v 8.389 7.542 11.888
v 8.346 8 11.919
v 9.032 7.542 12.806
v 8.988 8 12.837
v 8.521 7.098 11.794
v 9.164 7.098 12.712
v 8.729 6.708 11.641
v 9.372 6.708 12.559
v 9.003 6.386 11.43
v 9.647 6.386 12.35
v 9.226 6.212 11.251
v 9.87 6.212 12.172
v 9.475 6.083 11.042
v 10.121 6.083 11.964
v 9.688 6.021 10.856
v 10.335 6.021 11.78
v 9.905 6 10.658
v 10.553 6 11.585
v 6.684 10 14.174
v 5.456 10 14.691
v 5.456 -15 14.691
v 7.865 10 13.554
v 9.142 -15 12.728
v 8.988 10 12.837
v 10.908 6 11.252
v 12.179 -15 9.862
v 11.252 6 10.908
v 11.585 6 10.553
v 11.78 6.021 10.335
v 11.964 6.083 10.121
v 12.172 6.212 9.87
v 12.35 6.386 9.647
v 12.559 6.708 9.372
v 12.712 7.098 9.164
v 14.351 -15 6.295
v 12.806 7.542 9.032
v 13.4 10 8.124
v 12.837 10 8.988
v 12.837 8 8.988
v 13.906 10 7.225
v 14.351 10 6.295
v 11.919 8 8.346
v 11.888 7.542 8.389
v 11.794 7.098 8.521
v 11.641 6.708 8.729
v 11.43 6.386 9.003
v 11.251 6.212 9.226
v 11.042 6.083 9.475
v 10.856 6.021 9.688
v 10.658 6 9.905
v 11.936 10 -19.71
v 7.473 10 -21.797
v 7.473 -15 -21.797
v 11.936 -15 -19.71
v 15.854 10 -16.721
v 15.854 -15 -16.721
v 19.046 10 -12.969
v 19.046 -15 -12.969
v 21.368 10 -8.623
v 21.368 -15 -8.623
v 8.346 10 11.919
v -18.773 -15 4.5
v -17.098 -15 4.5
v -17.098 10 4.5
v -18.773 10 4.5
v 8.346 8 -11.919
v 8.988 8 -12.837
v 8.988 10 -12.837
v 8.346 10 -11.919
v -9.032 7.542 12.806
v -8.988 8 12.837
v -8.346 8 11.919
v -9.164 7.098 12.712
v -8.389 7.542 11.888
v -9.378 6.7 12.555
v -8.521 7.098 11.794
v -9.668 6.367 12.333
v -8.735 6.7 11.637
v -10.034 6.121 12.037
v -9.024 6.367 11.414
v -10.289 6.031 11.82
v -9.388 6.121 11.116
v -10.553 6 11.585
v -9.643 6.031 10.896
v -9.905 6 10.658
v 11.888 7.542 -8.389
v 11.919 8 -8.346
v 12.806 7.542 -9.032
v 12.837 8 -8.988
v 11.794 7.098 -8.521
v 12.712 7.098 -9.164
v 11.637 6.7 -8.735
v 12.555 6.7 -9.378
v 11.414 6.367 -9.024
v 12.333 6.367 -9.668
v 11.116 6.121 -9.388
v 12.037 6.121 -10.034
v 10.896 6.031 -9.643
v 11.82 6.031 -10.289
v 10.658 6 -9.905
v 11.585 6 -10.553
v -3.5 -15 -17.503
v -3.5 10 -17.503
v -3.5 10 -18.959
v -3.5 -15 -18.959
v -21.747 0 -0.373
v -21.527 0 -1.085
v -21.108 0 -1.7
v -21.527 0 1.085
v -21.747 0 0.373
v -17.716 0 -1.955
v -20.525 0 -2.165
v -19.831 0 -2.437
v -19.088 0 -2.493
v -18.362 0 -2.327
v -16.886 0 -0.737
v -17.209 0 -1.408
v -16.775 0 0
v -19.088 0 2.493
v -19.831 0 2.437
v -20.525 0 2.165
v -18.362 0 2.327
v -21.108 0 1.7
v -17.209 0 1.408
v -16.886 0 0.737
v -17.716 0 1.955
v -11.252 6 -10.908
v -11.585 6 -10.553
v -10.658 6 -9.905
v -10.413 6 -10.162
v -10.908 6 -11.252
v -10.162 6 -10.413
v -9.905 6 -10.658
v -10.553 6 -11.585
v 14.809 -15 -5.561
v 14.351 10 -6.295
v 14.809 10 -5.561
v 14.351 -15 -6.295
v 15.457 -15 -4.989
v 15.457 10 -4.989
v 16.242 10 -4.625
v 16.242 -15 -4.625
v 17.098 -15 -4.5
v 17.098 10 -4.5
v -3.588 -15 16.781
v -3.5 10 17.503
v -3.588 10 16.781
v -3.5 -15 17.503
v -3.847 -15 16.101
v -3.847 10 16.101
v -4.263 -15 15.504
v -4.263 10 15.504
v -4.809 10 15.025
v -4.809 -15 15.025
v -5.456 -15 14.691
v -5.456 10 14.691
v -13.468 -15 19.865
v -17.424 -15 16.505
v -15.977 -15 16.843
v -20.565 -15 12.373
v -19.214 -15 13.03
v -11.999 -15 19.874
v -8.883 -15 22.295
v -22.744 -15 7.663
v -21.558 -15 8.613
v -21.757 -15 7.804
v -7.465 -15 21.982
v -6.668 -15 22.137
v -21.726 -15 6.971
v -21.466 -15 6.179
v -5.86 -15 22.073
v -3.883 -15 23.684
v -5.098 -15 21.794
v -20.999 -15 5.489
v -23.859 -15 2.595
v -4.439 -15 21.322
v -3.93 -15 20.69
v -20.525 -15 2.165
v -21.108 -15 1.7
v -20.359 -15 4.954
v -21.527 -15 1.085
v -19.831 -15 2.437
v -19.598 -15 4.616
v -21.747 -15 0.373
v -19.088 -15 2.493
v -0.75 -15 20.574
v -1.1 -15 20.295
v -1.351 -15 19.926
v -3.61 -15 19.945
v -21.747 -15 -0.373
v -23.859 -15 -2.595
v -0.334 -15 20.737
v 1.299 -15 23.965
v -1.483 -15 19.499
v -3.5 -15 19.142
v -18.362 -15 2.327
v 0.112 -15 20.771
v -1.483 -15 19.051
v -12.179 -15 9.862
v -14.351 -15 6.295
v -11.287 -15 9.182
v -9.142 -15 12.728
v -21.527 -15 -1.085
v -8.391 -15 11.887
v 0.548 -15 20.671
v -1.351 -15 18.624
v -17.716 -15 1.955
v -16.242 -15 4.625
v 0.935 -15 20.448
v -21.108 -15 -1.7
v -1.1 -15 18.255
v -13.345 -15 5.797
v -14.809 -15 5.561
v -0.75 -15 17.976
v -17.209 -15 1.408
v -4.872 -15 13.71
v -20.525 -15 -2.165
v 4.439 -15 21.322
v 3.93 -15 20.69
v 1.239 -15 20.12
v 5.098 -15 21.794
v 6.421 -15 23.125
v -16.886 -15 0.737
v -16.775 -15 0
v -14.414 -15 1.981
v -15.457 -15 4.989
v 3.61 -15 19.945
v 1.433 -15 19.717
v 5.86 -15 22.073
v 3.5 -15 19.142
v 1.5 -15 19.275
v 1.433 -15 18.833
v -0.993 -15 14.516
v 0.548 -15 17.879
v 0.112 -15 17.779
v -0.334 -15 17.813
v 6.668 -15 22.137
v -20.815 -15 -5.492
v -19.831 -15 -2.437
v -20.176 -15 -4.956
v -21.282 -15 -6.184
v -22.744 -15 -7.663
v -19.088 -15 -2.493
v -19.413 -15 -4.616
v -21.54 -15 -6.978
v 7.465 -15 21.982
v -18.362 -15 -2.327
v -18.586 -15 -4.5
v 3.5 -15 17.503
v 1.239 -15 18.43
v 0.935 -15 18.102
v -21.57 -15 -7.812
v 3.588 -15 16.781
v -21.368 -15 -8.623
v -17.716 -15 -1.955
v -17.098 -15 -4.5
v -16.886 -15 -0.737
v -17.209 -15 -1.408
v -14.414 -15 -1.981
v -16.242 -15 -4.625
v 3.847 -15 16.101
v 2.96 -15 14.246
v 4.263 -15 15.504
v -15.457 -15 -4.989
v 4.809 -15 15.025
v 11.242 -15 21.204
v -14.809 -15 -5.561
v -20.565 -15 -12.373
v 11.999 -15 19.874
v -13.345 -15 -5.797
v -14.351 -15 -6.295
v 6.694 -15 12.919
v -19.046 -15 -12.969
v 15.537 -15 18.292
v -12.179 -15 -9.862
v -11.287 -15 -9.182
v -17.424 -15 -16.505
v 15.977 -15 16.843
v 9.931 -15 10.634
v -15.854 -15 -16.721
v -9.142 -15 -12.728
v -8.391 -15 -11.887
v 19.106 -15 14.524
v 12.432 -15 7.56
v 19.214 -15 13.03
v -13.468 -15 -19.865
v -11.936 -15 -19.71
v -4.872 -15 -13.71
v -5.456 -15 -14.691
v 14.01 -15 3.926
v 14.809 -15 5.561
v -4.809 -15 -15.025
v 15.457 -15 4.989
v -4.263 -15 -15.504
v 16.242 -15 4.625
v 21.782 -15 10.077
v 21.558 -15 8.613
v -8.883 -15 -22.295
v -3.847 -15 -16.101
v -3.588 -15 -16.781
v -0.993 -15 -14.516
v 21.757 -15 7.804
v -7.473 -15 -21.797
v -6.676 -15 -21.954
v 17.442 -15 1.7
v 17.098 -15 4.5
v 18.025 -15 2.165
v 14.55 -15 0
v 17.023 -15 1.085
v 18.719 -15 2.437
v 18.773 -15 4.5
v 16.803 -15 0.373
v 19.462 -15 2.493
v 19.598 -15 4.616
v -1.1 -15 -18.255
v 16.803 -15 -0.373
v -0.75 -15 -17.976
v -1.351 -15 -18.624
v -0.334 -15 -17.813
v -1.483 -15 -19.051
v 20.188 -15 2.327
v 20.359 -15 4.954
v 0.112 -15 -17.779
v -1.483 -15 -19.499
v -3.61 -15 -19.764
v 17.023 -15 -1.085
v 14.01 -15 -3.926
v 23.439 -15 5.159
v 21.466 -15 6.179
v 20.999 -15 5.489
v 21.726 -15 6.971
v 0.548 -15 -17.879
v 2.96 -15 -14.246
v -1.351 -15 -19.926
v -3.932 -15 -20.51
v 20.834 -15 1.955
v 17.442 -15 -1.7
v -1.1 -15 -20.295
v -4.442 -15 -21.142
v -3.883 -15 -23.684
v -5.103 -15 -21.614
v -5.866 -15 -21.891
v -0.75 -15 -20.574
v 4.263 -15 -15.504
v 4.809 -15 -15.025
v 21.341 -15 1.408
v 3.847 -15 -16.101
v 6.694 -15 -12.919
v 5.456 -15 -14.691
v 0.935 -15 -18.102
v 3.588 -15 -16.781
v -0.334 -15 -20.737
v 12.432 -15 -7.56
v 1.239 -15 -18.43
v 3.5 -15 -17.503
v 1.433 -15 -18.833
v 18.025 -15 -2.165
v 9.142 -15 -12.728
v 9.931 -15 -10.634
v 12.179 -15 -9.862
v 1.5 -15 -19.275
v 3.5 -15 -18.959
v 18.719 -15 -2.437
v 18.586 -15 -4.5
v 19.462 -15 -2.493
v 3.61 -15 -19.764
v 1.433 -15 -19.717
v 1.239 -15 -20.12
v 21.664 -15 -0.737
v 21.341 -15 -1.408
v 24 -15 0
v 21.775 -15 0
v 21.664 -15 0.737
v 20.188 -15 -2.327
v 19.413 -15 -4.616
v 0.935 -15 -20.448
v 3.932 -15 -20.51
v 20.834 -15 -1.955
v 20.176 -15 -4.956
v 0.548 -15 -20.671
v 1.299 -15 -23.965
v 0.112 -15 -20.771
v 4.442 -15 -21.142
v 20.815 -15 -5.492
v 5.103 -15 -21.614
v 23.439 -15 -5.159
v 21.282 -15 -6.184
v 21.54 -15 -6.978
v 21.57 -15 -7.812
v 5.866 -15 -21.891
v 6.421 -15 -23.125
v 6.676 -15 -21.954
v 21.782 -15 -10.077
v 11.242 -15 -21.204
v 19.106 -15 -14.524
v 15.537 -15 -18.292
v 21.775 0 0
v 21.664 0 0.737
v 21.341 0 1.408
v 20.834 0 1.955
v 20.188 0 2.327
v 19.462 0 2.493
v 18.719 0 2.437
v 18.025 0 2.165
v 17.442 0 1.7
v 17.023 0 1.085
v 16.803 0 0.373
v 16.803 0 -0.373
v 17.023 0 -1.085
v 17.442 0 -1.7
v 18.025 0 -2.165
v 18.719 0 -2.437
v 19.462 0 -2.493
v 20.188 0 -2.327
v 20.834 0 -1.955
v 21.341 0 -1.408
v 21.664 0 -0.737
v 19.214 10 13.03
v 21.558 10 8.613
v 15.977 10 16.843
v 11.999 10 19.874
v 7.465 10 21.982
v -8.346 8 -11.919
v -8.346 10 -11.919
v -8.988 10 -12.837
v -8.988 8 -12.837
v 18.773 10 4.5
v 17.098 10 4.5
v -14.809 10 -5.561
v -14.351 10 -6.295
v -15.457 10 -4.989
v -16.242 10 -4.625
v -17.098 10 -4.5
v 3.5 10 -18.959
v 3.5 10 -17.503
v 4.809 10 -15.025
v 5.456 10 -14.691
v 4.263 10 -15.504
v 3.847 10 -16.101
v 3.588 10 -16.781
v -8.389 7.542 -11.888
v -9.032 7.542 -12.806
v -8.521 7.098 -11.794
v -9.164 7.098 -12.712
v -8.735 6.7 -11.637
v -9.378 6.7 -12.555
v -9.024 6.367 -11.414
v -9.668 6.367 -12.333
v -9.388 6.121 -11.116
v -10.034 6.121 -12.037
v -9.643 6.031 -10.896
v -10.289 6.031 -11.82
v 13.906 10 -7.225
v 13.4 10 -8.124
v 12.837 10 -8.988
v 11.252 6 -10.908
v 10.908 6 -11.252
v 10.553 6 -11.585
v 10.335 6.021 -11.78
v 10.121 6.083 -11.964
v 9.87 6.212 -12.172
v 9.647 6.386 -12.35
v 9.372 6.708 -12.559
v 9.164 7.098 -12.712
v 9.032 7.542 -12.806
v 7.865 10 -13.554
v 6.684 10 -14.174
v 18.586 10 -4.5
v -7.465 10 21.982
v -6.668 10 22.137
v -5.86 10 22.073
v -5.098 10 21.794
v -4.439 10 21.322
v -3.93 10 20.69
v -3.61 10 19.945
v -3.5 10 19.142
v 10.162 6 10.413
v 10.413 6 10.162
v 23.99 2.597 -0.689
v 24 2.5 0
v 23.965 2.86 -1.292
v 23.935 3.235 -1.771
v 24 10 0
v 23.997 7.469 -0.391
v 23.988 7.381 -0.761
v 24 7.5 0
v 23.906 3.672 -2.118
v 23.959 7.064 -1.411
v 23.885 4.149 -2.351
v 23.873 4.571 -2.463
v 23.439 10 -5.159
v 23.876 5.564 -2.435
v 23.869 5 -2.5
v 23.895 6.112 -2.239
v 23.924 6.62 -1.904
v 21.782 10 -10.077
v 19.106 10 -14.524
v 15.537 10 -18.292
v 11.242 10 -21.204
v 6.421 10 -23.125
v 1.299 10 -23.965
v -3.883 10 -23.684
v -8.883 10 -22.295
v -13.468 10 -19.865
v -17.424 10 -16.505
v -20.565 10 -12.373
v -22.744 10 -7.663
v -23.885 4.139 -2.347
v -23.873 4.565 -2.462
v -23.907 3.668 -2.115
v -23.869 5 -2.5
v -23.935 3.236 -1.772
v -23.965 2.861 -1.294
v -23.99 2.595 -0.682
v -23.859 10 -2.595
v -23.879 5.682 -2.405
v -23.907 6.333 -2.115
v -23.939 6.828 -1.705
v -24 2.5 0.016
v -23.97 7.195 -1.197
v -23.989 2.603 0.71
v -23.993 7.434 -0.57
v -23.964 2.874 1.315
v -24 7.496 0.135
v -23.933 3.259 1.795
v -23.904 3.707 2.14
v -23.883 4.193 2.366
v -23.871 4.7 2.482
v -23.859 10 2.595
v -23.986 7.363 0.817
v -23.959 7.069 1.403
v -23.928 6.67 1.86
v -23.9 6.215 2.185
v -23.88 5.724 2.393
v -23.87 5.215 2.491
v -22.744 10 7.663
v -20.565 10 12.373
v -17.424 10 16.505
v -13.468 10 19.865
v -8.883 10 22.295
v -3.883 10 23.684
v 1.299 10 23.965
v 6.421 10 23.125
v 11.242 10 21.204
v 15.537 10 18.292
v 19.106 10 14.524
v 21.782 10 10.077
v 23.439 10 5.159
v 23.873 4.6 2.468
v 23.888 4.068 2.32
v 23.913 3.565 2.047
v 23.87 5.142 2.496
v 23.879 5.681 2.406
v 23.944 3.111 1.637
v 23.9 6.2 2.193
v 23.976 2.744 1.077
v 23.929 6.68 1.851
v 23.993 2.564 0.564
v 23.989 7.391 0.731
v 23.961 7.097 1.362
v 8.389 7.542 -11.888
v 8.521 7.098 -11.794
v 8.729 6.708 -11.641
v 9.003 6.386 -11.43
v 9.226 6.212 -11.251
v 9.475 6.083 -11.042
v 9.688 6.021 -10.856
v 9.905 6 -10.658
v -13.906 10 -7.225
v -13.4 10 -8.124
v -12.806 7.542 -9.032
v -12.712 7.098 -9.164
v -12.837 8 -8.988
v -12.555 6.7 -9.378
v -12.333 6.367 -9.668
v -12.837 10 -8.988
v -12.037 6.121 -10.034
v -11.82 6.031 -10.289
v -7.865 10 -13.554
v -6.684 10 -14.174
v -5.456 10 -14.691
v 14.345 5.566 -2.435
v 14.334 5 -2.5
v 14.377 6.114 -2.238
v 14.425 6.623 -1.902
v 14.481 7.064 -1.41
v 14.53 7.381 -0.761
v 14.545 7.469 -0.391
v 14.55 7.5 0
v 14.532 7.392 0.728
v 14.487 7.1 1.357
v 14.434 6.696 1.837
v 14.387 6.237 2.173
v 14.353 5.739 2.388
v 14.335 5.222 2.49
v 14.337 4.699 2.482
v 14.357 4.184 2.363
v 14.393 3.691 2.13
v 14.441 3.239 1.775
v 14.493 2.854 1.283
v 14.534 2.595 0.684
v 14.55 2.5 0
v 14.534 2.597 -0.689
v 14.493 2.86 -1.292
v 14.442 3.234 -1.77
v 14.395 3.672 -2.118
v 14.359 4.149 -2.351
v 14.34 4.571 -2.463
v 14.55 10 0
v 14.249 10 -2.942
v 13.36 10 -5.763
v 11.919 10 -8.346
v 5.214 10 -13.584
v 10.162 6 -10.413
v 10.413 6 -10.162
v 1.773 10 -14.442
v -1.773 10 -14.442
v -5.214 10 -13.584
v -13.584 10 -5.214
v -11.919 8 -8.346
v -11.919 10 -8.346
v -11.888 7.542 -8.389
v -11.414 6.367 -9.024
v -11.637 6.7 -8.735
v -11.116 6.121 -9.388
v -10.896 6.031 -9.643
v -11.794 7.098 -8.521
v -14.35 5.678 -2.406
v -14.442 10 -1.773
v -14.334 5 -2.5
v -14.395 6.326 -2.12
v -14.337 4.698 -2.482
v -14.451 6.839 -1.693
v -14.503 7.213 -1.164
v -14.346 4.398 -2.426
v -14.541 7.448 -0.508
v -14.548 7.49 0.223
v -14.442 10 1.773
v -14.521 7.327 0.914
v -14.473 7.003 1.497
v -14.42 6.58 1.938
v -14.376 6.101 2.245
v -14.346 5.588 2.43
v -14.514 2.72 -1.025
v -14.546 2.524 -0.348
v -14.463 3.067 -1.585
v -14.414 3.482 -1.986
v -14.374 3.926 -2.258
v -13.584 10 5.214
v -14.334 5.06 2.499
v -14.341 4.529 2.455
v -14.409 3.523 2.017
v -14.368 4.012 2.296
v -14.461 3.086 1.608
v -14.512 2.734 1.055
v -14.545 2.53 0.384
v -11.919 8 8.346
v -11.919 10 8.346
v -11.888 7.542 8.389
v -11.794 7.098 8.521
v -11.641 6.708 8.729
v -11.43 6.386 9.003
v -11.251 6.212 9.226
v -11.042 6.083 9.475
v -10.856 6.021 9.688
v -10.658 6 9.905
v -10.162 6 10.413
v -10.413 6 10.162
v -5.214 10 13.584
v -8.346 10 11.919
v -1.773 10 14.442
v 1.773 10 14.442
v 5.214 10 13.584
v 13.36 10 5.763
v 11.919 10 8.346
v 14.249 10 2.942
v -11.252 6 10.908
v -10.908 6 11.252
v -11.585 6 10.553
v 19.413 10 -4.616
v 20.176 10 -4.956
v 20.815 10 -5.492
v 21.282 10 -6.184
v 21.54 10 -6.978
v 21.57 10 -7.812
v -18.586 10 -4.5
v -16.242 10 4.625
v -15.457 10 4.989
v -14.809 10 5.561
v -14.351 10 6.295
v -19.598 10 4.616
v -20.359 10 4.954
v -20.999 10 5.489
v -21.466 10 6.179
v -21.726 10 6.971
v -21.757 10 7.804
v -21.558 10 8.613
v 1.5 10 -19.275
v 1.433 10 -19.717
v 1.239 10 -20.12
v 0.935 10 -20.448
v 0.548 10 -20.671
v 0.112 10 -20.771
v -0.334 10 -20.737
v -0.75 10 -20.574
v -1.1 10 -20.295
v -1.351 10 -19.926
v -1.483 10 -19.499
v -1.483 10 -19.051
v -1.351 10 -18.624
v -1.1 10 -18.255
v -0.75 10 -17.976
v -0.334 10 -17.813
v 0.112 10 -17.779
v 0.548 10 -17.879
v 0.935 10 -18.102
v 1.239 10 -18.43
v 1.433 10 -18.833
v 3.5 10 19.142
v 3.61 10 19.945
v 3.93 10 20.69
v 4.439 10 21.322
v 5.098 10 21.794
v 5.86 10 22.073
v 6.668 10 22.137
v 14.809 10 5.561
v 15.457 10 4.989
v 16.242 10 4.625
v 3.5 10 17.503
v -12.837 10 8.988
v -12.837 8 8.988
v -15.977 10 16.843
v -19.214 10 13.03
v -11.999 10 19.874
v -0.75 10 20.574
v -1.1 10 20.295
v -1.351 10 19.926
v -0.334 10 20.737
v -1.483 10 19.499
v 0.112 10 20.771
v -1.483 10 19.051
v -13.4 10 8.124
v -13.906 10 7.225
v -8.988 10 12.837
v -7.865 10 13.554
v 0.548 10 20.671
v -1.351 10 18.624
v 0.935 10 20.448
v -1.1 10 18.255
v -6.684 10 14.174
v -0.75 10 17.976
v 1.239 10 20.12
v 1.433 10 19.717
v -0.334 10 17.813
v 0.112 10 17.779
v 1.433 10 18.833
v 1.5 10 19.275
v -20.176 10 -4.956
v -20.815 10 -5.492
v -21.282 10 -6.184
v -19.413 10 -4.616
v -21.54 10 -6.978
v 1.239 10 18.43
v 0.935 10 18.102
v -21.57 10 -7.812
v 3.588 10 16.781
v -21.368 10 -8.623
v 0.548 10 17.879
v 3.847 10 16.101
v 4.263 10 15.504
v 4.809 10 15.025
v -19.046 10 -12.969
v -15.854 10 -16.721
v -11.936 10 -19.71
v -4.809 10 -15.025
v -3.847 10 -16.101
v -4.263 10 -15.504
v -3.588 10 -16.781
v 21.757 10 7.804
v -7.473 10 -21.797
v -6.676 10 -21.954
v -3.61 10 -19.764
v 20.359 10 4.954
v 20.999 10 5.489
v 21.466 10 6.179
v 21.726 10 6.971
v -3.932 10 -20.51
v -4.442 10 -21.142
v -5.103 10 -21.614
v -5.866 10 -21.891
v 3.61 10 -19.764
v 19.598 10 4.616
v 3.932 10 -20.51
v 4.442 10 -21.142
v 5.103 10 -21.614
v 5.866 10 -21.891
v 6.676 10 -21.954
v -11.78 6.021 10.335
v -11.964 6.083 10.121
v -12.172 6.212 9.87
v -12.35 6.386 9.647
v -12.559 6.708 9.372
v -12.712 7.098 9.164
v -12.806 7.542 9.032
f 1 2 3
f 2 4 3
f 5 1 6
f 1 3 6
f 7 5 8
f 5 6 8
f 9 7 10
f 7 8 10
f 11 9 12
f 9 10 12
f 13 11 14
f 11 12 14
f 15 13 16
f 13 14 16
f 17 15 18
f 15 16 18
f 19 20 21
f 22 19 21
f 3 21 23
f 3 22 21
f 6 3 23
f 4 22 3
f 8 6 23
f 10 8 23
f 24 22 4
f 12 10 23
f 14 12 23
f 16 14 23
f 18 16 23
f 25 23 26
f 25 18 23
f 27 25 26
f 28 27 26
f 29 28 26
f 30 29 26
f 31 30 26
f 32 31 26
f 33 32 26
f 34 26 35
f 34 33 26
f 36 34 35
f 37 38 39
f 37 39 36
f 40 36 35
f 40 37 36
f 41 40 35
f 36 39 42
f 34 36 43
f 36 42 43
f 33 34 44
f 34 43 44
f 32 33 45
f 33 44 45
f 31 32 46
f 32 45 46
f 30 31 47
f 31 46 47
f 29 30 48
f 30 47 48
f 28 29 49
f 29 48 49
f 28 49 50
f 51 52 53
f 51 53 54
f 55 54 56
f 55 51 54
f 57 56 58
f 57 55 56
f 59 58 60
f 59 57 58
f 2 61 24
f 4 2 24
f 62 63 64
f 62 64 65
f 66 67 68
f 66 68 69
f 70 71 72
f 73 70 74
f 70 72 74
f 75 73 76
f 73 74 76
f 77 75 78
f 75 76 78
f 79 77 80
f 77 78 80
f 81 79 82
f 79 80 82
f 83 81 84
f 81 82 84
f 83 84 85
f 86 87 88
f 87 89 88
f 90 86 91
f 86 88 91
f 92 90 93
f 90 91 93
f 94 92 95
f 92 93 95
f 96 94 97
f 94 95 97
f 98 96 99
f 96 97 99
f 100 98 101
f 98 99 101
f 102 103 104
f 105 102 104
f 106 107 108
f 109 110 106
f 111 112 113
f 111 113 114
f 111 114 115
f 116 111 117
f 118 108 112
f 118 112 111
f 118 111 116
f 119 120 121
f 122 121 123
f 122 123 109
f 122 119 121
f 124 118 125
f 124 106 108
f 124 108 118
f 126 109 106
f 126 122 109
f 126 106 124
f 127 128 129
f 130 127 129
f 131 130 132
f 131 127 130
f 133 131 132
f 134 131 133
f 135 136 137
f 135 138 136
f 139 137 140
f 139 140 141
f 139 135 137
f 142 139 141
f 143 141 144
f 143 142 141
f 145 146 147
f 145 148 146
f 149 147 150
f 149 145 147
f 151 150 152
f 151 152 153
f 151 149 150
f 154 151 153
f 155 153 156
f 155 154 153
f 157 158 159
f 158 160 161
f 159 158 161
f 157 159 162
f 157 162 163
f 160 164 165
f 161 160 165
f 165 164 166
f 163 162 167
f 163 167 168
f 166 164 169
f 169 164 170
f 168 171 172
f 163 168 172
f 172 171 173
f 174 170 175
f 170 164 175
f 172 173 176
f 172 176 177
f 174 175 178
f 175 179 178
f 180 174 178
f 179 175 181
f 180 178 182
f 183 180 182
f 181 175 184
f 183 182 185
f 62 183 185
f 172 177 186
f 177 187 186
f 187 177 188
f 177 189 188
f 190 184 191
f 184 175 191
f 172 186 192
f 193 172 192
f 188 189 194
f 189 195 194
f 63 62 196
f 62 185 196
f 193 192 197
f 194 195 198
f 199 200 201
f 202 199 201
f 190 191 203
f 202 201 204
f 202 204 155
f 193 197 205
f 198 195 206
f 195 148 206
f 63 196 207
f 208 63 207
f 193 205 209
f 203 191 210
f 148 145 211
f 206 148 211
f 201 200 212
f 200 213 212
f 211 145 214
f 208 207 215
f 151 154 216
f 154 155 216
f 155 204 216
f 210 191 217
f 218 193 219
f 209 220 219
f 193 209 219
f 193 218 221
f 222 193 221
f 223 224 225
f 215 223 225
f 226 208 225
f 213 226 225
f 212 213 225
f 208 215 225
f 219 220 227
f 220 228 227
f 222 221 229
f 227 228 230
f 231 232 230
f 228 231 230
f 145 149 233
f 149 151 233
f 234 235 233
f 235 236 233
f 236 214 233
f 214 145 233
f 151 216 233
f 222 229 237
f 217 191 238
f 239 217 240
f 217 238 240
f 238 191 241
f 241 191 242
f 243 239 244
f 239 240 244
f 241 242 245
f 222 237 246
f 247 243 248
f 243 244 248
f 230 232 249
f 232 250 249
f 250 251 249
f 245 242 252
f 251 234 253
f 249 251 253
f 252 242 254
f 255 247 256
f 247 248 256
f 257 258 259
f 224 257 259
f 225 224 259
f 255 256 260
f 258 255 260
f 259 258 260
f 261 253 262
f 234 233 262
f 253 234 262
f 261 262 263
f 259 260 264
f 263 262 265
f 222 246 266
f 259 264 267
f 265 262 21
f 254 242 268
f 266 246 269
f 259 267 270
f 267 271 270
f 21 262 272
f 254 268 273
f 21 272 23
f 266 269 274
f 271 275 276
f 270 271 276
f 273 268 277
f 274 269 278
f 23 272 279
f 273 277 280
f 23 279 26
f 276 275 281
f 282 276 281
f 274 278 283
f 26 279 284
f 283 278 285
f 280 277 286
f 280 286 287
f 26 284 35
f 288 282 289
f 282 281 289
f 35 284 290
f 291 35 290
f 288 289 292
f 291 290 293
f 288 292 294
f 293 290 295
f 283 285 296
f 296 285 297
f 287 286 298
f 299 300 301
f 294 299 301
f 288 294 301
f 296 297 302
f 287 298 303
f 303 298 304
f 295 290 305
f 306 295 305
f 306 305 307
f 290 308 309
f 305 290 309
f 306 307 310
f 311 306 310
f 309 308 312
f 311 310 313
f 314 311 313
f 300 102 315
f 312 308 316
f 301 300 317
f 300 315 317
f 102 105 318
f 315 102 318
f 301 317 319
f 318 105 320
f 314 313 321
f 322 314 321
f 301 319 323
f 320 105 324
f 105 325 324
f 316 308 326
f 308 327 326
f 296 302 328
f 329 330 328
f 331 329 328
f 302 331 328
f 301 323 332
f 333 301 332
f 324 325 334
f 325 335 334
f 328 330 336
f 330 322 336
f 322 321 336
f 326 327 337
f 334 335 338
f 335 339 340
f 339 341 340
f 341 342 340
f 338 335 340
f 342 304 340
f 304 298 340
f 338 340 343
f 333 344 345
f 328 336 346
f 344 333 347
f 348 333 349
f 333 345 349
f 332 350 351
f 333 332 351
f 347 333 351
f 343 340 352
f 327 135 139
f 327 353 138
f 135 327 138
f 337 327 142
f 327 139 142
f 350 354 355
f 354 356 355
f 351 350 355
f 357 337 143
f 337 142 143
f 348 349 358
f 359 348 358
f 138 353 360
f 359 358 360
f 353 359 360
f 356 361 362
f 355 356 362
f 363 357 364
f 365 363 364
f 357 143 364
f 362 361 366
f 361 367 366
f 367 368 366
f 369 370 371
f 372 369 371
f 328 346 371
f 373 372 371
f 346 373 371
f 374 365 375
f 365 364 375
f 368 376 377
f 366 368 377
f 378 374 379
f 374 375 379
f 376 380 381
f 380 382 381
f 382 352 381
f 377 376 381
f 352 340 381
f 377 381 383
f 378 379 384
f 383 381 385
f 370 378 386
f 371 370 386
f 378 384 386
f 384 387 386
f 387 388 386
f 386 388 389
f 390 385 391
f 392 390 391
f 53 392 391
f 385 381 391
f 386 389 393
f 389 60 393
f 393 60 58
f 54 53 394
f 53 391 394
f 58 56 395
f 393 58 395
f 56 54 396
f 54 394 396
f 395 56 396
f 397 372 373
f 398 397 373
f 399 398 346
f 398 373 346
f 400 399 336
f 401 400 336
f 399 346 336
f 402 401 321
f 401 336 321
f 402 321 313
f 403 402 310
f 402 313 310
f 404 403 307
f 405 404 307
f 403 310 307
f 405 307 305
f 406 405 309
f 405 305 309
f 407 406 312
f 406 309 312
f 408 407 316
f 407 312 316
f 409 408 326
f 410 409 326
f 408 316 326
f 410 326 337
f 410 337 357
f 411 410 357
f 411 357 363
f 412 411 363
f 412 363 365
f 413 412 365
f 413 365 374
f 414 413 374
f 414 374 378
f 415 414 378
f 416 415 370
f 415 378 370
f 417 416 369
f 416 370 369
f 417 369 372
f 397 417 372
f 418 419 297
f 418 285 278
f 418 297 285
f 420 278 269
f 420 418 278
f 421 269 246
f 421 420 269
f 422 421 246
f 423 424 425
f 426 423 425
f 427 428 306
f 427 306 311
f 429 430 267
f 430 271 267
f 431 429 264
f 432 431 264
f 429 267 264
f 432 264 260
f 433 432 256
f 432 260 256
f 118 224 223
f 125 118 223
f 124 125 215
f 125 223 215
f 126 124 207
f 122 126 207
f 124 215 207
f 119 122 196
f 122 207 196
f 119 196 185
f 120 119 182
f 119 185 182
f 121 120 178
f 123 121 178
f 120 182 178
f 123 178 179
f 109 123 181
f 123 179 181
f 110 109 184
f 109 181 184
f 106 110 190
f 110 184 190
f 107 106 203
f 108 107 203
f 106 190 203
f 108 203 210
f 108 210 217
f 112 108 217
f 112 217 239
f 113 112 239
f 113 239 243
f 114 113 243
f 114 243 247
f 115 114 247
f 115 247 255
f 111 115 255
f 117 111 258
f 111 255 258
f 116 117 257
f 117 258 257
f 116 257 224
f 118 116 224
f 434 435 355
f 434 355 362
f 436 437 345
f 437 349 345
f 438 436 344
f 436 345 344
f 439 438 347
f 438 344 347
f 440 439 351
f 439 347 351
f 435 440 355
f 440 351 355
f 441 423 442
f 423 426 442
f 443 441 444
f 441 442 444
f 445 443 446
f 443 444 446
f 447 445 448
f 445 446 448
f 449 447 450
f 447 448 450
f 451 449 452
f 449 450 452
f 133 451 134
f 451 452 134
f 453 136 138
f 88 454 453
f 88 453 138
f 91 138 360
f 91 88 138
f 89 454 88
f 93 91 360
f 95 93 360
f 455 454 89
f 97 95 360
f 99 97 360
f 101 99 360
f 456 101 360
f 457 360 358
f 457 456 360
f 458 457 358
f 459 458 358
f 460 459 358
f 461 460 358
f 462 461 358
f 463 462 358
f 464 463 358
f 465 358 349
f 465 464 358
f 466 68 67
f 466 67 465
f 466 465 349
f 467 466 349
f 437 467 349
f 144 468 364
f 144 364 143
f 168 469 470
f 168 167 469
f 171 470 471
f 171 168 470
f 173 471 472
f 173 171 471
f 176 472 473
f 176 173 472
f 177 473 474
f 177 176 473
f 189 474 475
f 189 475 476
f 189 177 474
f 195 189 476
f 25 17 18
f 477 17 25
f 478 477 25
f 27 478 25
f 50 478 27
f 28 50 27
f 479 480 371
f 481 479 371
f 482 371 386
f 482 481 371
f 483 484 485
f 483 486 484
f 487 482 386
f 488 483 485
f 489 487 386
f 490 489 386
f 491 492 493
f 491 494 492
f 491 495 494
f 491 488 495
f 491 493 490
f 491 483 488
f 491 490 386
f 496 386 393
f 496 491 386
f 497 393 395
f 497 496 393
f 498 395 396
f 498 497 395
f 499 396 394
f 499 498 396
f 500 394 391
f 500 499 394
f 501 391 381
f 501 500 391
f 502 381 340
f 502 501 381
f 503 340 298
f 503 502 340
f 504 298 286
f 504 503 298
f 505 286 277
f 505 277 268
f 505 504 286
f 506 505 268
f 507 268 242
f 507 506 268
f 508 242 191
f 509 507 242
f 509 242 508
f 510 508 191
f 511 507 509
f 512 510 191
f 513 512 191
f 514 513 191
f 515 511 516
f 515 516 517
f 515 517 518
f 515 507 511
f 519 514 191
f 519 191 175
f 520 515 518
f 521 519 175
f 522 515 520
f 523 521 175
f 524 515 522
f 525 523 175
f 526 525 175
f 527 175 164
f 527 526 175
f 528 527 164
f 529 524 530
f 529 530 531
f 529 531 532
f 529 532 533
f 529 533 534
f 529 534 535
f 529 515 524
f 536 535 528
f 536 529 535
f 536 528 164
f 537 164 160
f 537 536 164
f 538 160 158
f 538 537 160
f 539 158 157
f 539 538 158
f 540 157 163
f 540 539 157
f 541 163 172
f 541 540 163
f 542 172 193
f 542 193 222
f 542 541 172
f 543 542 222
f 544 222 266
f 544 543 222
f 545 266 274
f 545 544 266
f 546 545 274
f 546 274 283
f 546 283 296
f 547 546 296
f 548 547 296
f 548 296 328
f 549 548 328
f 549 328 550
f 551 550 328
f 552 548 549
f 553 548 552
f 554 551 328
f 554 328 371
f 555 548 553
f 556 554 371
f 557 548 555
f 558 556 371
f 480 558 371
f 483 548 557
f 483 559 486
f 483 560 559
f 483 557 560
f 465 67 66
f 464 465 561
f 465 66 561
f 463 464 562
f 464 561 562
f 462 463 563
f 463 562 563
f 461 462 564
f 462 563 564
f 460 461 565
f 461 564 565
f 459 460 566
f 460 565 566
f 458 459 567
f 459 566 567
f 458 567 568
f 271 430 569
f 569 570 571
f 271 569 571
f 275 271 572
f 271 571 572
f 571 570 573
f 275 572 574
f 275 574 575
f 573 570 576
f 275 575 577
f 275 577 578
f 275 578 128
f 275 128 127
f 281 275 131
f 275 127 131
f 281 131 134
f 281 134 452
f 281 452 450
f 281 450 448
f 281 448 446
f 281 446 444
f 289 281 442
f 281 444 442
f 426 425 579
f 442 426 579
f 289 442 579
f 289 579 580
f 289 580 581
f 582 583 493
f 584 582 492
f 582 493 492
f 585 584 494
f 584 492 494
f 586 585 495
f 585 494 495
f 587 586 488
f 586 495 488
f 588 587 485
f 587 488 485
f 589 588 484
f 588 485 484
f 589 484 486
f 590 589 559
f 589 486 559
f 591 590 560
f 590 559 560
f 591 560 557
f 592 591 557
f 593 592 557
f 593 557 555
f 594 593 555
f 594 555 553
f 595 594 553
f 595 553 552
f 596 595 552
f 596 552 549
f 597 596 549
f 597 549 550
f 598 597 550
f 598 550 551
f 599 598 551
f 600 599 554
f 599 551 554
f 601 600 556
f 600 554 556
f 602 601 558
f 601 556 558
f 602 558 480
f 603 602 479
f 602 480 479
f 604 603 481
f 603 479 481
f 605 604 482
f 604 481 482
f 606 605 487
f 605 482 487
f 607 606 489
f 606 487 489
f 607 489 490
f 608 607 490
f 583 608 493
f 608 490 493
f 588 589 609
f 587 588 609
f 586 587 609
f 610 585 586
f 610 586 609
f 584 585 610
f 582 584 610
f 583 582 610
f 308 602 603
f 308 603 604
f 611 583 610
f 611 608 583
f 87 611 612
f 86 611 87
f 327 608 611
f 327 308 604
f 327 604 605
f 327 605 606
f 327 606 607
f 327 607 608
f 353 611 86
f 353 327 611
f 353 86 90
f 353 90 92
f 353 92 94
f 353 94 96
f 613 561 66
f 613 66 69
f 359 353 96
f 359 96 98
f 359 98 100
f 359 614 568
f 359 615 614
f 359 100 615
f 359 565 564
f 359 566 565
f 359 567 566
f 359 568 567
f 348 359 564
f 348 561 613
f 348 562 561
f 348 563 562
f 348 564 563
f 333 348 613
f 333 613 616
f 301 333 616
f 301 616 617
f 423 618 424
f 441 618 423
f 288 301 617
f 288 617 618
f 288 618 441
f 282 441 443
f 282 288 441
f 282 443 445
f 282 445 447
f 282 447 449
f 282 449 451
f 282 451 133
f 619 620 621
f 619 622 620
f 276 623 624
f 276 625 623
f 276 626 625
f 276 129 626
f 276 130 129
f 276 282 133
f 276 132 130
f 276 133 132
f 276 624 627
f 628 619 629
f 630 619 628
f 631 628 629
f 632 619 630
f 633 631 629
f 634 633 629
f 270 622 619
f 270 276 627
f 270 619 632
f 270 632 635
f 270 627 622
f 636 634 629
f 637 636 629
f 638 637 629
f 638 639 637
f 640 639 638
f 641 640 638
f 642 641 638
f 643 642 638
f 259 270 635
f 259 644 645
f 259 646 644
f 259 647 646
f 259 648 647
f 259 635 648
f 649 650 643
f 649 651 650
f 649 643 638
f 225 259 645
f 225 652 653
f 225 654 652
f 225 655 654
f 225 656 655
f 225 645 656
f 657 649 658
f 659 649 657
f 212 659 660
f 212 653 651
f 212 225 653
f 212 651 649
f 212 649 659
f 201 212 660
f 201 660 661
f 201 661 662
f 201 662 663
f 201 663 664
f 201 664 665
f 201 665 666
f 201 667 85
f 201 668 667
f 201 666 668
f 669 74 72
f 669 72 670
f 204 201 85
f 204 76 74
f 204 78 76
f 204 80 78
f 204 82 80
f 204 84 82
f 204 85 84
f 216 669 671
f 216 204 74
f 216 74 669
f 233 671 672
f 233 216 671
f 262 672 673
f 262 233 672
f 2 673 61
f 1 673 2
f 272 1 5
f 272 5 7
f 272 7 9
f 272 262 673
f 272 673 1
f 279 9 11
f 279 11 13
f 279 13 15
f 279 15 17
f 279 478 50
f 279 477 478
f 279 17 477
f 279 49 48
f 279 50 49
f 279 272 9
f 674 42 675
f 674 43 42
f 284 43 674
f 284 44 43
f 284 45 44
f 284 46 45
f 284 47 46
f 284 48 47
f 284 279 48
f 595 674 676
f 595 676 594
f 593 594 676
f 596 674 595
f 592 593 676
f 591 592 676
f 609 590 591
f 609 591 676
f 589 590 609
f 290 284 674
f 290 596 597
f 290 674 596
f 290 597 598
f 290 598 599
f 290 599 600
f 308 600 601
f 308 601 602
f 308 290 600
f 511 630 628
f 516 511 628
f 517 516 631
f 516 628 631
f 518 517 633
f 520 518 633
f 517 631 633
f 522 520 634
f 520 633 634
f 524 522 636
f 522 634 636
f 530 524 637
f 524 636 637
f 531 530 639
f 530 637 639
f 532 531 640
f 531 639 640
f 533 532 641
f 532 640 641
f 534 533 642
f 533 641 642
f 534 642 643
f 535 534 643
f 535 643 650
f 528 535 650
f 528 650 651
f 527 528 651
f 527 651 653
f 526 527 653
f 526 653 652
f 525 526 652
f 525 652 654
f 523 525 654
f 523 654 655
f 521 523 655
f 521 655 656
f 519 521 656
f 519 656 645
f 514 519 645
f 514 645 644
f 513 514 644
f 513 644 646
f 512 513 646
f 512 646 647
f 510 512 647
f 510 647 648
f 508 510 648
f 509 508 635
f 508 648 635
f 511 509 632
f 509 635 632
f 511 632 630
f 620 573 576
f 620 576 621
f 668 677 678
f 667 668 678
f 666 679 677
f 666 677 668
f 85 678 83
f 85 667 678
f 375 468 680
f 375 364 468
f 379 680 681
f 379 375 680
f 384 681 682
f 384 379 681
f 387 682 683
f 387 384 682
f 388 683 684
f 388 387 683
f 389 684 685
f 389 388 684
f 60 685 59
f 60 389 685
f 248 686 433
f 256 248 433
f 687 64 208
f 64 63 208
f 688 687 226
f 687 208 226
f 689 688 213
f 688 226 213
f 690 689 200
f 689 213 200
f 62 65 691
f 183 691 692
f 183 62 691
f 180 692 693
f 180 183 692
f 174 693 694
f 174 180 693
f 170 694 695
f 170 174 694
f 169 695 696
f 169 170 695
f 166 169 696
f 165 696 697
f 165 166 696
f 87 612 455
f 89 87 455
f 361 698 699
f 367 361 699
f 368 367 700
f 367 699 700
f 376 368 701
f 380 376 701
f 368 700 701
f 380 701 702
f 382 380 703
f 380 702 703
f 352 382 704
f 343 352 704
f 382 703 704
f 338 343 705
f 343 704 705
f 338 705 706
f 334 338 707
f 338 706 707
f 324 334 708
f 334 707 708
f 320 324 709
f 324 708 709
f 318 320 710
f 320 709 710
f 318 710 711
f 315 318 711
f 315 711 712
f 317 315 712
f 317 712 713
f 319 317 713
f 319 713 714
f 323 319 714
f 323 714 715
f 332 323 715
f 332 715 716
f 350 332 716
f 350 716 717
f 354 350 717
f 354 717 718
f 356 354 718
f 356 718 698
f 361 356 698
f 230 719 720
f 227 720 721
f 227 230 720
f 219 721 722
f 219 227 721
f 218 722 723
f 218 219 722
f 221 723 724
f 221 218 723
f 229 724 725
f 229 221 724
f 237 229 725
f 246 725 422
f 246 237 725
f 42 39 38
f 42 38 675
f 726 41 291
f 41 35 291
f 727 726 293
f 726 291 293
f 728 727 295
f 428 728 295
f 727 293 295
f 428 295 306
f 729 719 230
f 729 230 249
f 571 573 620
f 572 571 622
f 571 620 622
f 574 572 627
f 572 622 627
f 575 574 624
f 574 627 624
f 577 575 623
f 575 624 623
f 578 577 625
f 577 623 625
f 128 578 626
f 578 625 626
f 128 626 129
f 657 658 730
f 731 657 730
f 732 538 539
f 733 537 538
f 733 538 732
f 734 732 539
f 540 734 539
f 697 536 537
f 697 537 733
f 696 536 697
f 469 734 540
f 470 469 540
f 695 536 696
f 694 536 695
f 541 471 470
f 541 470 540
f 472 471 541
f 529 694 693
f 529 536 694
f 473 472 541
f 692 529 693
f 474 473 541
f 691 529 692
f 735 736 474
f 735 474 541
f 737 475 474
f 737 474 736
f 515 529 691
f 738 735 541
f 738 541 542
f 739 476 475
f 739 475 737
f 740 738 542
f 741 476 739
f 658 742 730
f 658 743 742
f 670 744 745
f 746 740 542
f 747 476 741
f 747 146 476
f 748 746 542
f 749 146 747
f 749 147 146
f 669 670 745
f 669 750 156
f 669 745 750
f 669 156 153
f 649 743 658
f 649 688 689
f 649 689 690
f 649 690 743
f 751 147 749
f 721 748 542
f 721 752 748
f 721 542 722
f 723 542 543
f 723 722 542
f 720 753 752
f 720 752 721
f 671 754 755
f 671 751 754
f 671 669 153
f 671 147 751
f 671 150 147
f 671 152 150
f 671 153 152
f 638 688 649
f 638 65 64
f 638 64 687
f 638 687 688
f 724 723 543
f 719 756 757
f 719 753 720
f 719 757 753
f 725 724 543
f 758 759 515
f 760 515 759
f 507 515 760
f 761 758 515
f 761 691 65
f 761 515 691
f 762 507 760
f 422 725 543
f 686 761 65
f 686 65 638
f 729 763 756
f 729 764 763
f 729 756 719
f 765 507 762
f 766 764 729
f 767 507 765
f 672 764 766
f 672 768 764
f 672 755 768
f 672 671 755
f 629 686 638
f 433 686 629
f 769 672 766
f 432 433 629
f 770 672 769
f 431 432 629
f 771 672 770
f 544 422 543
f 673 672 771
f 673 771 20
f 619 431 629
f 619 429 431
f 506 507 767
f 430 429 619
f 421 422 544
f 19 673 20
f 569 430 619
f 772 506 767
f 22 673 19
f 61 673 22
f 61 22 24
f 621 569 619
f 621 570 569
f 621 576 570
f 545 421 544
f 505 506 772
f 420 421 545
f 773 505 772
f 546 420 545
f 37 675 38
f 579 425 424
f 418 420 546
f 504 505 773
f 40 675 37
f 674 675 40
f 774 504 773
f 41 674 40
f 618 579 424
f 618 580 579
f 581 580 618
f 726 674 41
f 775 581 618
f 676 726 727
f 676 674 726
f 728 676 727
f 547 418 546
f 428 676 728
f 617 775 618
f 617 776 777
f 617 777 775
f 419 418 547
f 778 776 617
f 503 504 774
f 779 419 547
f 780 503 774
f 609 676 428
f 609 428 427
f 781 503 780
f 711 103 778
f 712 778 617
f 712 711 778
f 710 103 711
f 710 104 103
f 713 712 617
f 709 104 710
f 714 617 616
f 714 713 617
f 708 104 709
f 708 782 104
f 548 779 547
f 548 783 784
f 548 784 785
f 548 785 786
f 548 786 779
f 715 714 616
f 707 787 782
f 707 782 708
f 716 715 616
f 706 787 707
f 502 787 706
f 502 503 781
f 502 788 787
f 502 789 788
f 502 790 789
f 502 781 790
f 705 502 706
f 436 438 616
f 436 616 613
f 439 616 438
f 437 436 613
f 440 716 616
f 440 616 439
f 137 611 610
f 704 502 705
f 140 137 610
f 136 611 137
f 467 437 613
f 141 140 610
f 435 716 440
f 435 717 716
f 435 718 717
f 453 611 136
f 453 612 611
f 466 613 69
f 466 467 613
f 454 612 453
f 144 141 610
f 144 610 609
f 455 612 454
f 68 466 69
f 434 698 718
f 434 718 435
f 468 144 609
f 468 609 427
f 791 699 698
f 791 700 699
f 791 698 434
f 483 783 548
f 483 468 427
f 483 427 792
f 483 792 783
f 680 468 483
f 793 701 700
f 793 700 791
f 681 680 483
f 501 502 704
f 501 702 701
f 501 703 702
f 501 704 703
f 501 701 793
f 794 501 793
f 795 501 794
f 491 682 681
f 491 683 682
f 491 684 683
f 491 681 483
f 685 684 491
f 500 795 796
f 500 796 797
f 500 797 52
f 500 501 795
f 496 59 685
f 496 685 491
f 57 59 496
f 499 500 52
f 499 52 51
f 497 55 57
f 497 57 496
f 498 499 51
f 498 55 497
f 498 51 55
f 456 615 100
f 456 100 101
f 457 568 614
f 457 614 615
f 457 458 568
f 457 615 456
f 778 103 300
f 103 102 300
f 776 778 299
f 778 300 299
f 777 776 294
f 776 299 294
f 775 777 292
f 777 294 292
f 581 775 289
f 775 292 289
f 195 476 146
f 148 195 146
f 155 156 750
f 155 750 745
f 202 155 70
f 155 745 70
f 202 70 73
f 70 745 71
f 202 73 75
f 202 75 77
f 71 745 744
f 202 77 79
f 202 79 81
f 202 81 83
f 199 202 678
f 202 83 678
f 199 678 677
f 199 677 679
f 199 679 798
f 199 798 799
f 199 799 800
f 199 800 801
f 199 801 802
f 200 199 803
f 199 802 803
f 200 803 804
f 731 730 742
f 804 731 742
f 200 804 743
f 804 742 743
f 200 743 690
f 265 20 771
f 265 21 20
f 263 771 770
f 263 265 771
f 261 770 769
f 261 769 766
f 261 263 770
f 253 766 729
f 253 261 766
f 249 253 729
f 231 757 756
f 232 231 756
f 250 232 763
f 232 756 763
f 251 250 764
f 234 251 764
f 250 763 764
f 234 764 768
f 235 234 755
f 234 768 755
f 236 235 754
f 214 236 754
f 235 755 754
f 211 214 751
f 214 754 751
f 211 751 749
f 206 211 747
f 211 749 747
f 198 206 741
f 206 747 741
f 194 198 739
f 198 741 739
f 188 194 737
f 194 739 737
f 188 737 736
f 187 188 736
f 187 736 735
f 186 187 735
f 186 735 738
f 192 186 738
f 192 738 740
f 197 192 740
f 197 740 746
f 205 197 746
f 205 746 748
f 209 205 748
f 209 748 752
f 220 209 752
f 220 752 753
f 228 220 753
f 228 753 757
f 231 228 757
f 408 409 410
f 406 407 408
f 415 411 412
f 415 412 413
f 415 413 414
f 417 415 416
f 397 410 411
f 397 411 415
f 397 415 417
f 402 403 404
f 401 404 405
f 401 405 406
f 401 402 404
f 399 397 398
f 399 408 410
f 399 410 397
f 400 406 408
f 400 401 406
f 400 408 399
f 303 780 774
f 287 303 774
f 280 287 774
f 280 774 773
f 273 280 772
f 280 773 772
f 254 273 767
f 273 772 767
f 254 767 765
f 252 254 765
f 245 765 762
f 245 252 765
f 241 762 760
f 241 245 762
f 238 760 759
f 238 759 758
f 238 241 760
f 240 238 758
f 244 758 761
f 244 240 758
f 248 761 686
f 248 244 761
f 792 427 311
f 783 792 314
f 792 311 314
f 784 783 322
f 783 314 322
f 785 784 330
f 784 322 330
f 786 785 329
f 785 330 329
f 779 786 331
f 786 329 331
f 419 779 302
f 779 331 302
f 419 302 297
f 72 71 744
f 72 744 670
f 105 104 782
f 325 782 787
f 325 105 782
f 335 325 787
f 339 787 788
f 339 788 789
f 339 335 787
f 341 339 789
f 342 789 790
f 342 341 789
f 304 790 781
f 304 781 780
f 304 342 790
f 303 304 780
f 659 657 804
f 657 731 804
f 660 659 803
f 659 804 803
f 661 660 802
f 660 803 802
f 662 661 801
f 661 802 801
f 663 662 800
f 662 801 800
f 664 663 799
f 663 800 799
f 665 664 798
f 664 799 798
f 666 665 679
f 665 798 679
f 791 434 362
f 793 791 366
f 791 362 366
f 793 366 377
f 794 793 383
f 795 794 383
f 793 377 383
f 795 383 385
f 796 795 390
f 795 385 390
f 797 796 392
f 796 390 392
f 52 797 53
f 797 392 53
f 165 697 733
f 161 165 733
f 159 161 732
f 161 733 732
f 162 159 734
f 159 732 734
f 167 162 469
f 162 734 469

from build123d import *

# Parameters (mm, degrees)
SKETCH3_R                = 24
SKETCH3_R_2              = 14.55
BOSS_EXTRUDE1_DEPTH      = 10
BOSS_EXTRUDE1_DEPTH_BACK = 15
CUT_EXTRUDE2_START       = 50
SKETCH4_R                = 2.5
CUT_EXTRUDE2_DEPTH       = 100
SKETCH5_R                = 1.5
CUT_EXTRUDE3_DEPTH       = 100
CUT_EXTRUDE6_DEPTH       = 26
CUT_EXTRUDE7_DEPTH       = 26
CUT_EXTRUDE8_DEPTH       = 26
CUT_EXTRUDE9_DEPTH       = 26
FILLET5_R                = 3
CUT_EXTRUDE12_DEPTH      = 4
FILLET10_R               = 2
SKETCH20_R               = 2.5
CUT_EXTRUDE13_DEPTH      = 15


with BuildPart() as part:
    # Sketch3 → Boss-Extrude1 (new body, two sides)
    with BuildSketch(Plane(origin=(0, 0, 0), x_dir=(1, 0, 0), z_dir=(0, 1, 0))) as boss_extrude1_sk:
        Circle(SKETCH3_R)
        Circle(SKETCH3_R_2, mode=Mode.SUBTRACT)
    extrude(amount=BOSS_EXTRUDE1_DEPTH)
    extrude(boss_extrude1_sk.sketch, amount=-BOSS_EXTRUDE1_DEPTH_BACK)

    # Sketch4 → Cut-Extrude2 (cut)
    with BuildSketch(Plane(origin=(0, 0, 0), x_dir=(0, 0, -1), z_dir=(1, 0, 0)).offset(CUT_EXTRUDE2_START)):
        with Locations((0, 5)):
            Circle(SKETCH4_R)
    extrude(amount=-CUT_EXTRUDE2_DEPTH, mode=Mode.SUBTRACT)

    # Sketch5 → Cut-Extrude3 (cut)
    with BuildSketch(Plane(origin=(0, 10, 0), x_dir=(1, 0, 0), z_dir=(0, 1, 0))):
        with Locations((0, 19.275)):
            Circle(SKETCH5_R)
        with Locations((0, -19.275)):
            Circle(SKETCH5_R)
    extrude(amount=-CUT_EXTRUDE3_DEPTH, mode=Mode.SUBTRACT)

    # Sketch7 → Cut-Extrude6 (cut)
    with BuildSketch(Plane(origin=(0, 10, 0), x_dir=(1, 0, 0), z_dir=(0, 1, 0))):
        with BuildLine():
            Line((3.5, 15.275), (3.5, 22.775))
            ThreePointArc((3.5, 22.775), (15.930450829, 16.648464235), (22.598686356, 4.5))
            Line((22.598686356, 4.5), (15.010850242, 4.5))
            ThreePointArc((15.010850242, 4.5), (10.709250694, 11.440610761), (3.5, 15.275))
        make_face()
    extrude(amount=-CUT_EXTRUDE6_DEPTH, mode=Mode.SUBTRACT)

    # Sketch9 → Cut-Extrude7 (cut)
    with BuildSketch(Plane(origin=(0, 10, 0), x_dir=(1, 0, 0), z_dir=(0, 1, 0))):
        with BuildLine():
            Line((15.010850242, -4.5), (22.775, -4.5))
            ThreePointArc((22.775, -4.5), (16.052855024, -16.770702746), (3.5, -22.94995915))
            Line((3.5, -22.94995915), (3.5, -15.275))
            ThreePointArc((3.5, -15.275), (10.709250694, -11.440610761), (15.010850242, -4.5))
        make_face()
    extrude(amount=-CUT_EXTRUDE7_DEPTH, mode=Mode.SUBTRACT)

    # Sketch10 → Cut-Extrude8 (cut)
    with BuildSketch(Plane(origin=(0, 10, 0), x_dir=(1, 0, 0), z_dir=(0, 1, 0))):
        with BuildLine():
            Line((-3.5, 15.275), (-3.5, 22.775))
            ThreePointArc((-3.5, 22.775), (-15.930450829, 16.648464235), (-22.598686356, 4.5))
            Line((-22.598686356, 4.5), (-15.010850242, 4.5))
            ThreePointArc((-15.010850242, 4.5), (-10.709250694, 11.440610761), (-3.5, 15.275))
        make_face()
    extrude(amount=-CUT_EXTRUDE8_DEPTH, mode=Mode.SUBTRACT)

    # Sketch11 → Cut-Extrude9 (cut)
    with BuildSketch(Plane(origin=(0, 10, 0), x_dir=(1, 0, 0), z_dir=(0, 1, 0))):
        with BuildLine():
            Line((-15.010850242, -4.5), (-22.775, -4.5))
            ThreePointArc((-22.775, -4.5), (-16.052855024, -16.770702746), (-3.5, -22.94995915))
            Line((-3.5, -22.94995915), (-3.5, -15.275))
            ThreePointArc((-3.5, -15.275), (-10.709250694, -11.440610761), (-15.010850242, -4.5))
        make_face()
    extrude(amount=-CUT_EXTRUDE9_DEPTH, mode=Mode.SUBTRACT)

    # Fillet5
    fillet5_edges = [part.edges().sort_by_distance(p)[0] for p in [
        (-3.5, -2.5, 22.94995915),
        (-22.775, -2.5, 4.5),
        (-15.010850242, -2.5, 4.5),
        (-3.5, -2.5, 15.275),
        (3.5, -2.5, -22.775),
        (22.598686356, -2.5, -4.5),
        (15.010850242, -2.5, -4.5),
        (3.5, -2.5, -15.275),
        (3.5, -2.5, 15.275),
        (15.010850242, -2.5, 4.5),
        (22.775, -2.5, 4.5),
        (3.5, -2.5, 22.94995915),
        (-3.5, -2.5, -15.275),
        (-15.010850242, -2.5, -4.5),
        (-22.598686356, -2.5, -4.5),
        (-3.5, -2.5, -22.775),
    ]]
    fillet(fillet5_edges, radius=FILLET5_R)

    # Sketch19 → Cut-Extrude12 (cut)
    with BuildSketch(Plane(origin=(0, 10, 0), x_dir=(1, 0, 0), z_dir=(0, 1, 0))):
        with BuildLine():
            Line((-12.836811042, 8.988431858), (-11.918662244, 8.345537149))
            ThreePointArc((-11.918662244, 8.345537149), (-10.288403666, 10.288403666), (-8.345537149, 11.918662244))
            Line((-8.345537149, 11.918662244), (-8.988431858, 12.836811042))
            ThreePointArc((-8.988431858, 12.836811042), (-11.080966226, 11.080966226), (-12.836811042, 8.988431858))
        make_face()
        with BuildLine():
            Line((8.988431858, 12.836811042), (8.345537149, 11.918662244))
            ThreePointArc((8.345537149, 11.918662244), (10.288403666, 10.288403666), (11.918662244, 8.345537149))
            Line((11.918662244, 8.345537149), (12.836811042, 8.988431858))
            ThreePointArc((12.836811042, 8.988431858), (11.080966226, 11.080966226), (8.988431858, 12.836811042))
        make_face()
        with BuildLine():
            ThreePointArc((11.918662244, -8.345537149), (10.288403666, -10.288403666), (8.345537149, -11.918662244))
            Line((8.345537149, -11.918662244), (8.988431858, -12.836811042))
            ThreePointArc((8.988431858, -12.836811042), (11.080966226, -11.080966226), (12.836811042, -8.988431858))
            Line((12.836811042, -8.988431858), (11.918662244, -8.345537149))
        make_face()
        with BuildLine():
            Line((-8.988431858, -12.836811042), (-8.345537149, -11.918662244))
            ThreePointArc((-8.345537149, -11.918662244), (-10.288403666, -10.288403666), (-11.918662244, -8.345537149))
            Line((-11.918662244, -8.345537149), (-12.836811042, -8.988431858))
            ThreePointArc((-12.836811042, -8.988431858), (-11.080966226, -11.080966226), (-8.988431858, -12.836811042))
        make_face()
    extrude(amount=-CUT_EXTRUDE12_DEPTH, mode=Mode.SUBTRACT)

    # Fillet10
    fillet10_edges = [part.edges().sort_by_distance(p)[0] for p in [
        (-12.377736643, 6, 8.666984504),
        (-8.666984504, 6, 12.377736643),
        (8.666984504, 6, 12.377736643),
        (12.377736643, 6, 8.666984504),
        (12.377736643, 6, -8.666984504),
        (8.666984504, 6, -12.377736643),
        (-8.666984504, 6, -12.377736643),
        (-12.377736643, 6, -8.666984504),
    ]]
    fillet(fillet10_edges, radius=FILLET10_R)

    # Sketch20 → Cut-Extrude13 (cut)
    with BuildSketch(Plane.XZ.offset(15)):
        with Locations((-19.275, 0)):
            Circle(SKETCH20_R)
        with Locations((19.275, 0)):
            Circle(SKETCH20_R)
    extrude(amount=-CUT_EXTRUDE13_DEPTH, mode=Mode.SUBTRACT)


solid = part.part
